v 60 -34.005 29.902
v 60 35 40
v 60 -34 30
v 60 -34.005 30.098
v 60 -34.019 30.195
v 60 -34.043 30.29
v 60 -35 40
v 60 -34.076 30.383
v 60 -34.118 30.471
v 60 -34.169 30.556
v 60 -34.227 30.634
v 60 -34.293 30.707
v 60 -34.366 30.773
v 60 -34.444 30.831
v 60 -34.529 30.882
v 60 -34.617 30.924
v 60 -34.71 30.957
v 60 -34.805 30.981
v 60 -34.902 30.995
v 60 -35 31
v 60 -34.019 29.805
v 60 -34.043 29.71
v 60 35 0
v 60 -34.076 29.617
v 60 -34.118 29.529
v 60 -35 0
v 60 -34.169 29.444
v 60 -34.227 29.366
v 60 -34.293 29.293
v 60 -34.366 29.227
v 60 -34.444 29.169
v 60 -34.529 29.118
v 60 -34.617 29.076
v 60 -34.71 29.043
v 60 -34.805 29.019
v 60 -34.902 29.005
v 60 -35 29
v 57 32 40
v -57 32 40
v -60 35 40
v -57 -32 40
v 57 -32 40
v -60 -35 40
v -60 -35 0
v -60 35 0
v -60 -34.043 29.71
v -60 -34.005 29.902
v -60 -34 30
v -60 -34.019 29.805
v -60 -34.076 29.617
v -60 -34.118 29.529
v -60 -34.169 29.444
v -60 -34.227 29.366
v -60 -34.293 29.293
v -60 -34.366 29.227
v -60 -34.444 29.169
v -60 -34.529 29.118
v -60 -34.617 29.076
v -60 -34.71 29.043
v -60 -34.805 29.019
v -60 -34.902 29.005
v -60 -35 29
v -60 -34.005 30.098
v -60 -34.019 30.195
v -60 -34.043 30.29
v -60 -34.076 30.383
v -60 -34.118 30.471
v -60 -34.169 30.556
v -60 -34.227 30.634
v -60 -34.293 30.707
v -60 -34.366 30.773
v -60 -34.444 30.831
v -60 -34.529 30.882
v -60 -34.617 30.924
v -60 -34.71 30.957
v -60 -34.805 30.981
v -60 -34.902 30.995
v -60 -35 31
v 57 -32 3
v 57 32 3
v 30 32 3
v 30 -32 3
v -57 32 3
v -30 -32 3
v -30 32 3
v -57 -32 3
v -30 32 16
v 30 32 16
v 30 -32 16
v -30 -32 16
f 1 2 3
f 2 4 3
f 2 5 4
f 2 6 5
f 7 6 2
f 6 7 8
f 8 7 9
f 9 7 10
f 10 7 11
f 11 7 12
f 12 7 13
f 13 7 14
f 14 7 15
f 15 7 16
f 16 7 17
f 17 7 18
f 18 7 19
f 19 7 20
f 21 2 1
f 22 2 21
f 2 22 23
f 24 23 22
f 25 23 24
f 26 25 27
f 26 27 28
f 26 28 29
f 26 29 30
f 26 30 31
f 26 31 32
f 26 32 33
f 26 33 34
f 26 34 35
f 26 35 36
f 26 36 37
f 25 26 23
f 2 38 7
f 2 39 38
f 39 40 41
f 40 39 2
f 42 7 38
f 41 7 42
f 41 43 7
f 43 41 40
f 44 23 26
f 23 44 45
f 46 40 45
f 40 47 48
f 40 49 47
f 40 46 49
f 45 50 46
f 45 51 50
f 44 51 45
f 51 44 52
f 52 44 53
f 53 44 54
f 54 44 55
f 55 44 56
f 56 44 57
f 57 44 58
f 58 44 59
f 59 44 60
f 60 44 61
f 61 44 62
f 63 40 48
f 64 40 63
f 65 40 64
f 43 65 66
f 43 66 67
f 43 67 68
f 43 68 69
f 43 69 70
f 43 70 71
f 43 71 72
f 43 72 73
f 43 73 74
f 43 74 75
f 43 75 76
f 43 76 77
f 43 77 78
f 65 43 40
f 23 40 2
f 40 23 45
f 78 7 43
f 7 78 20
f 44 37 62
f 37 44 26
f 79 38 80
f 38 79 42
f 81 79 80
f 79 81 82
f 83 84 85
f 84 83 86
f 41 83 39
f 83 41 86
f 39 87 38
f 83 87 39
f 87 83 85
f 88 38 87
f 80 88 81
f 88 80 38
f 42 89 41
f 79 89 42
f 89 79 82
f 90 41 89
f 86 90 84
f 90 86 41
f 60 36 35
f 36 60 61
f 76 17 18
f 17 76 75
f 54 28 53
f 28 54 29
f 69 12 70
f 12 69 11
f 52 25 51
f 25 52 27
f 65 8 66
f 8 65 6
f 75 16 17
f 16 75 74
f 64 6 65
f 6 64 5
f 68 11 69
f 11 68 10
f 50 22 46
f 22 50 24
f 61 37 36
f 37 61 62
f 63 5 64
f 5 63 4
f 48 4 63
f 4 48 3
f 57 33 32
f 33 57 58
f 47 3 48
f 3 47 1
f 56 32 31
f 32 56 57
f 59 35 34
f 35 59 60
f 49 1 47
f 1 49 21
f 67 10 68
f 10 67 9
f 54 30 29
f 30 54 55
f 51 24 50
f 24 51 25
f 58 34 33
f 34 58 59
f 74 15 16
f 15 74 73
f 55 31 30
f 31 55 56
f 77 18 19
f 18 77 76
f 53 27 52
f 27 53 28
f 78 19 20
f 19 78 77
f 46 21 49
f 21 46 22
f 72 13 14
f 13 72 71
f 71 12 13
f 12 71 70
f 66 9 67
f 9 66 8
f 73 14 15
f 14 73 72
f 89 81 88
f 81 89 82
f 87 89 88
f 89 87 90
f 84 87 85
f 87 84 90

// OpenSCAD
// --- Dimensions (mm) ---
outer_x = 120;          // Total length of the tank
outer_y = 70;           // Total width of the tank
outer_z = 40;           // Total height of the tank
wall_thickness = 3;     // Thickness of the side walls
floor_thickness = 3;     // Thickness of the bottom floor

platform_length = 60;    // Length of the central platform along X
platform_height = 13;    // Height of the platform top from the inner floor
platform_width = outer_y; // Platform spans the full inner width (Y)

hole_diameter = 2;      // Diameter of the electrode wire holes
hole_y_pos = 0;         // Y position of the holes (centered on Y)
hole_z_pos = 30;        // Z position of the holes

// --- Constants ---
$fn = 64;

// --- Implementation ---

// The tank is built in one piece. 
// We start with the outer shell and subtract the interior volume.
// Then we add the platform inside.

module buffer_tank() {
    difference() {
        // Main Outer Body
        cube([outer_x, outer_y, outer_z]);

        // Interior Cavity
        translate([wall_thickness, wall_thickness, floor_thickness]) {
            cube([outer_x - 2*wall_thickness, outer_y - 2*wall_thickness, outer_z]);
        }

        // Electrode Wire Holes
        // Holes are drilled through the X-walls at the ends.
        // We use a cylinder along the X axis.
        // To ensure a clean cut, we make the cylinder longer than the tank.
        translate([-1, hole_y_pos, hole_z_pos])
            rotate([0, 90, 0])
                cylinder(d = hole_diameter, h = outer_x + 2);
    }

    // The Platform
    // The platform is inside the tank. 
    // It is centered in X.
    // Its top is at z = floor_thickness + platform_height.
    // Its width is the inner width (outer_y - 2*wall_thickness).
    
    translate([
        (outer_x / 2) - (platform_length / 2), 
        wall_thickness, 
        floor_thickness
    ]) {
        cube([
            platform_length, 
            outer_y - 2*wall_thickness, 
            platform_height
        ]);
    }
}

// Render the part
// The part is centered on the XY plane as requested.
translate([-outer_x/2, -outer_y/2, 0])
    buffer_tank();
